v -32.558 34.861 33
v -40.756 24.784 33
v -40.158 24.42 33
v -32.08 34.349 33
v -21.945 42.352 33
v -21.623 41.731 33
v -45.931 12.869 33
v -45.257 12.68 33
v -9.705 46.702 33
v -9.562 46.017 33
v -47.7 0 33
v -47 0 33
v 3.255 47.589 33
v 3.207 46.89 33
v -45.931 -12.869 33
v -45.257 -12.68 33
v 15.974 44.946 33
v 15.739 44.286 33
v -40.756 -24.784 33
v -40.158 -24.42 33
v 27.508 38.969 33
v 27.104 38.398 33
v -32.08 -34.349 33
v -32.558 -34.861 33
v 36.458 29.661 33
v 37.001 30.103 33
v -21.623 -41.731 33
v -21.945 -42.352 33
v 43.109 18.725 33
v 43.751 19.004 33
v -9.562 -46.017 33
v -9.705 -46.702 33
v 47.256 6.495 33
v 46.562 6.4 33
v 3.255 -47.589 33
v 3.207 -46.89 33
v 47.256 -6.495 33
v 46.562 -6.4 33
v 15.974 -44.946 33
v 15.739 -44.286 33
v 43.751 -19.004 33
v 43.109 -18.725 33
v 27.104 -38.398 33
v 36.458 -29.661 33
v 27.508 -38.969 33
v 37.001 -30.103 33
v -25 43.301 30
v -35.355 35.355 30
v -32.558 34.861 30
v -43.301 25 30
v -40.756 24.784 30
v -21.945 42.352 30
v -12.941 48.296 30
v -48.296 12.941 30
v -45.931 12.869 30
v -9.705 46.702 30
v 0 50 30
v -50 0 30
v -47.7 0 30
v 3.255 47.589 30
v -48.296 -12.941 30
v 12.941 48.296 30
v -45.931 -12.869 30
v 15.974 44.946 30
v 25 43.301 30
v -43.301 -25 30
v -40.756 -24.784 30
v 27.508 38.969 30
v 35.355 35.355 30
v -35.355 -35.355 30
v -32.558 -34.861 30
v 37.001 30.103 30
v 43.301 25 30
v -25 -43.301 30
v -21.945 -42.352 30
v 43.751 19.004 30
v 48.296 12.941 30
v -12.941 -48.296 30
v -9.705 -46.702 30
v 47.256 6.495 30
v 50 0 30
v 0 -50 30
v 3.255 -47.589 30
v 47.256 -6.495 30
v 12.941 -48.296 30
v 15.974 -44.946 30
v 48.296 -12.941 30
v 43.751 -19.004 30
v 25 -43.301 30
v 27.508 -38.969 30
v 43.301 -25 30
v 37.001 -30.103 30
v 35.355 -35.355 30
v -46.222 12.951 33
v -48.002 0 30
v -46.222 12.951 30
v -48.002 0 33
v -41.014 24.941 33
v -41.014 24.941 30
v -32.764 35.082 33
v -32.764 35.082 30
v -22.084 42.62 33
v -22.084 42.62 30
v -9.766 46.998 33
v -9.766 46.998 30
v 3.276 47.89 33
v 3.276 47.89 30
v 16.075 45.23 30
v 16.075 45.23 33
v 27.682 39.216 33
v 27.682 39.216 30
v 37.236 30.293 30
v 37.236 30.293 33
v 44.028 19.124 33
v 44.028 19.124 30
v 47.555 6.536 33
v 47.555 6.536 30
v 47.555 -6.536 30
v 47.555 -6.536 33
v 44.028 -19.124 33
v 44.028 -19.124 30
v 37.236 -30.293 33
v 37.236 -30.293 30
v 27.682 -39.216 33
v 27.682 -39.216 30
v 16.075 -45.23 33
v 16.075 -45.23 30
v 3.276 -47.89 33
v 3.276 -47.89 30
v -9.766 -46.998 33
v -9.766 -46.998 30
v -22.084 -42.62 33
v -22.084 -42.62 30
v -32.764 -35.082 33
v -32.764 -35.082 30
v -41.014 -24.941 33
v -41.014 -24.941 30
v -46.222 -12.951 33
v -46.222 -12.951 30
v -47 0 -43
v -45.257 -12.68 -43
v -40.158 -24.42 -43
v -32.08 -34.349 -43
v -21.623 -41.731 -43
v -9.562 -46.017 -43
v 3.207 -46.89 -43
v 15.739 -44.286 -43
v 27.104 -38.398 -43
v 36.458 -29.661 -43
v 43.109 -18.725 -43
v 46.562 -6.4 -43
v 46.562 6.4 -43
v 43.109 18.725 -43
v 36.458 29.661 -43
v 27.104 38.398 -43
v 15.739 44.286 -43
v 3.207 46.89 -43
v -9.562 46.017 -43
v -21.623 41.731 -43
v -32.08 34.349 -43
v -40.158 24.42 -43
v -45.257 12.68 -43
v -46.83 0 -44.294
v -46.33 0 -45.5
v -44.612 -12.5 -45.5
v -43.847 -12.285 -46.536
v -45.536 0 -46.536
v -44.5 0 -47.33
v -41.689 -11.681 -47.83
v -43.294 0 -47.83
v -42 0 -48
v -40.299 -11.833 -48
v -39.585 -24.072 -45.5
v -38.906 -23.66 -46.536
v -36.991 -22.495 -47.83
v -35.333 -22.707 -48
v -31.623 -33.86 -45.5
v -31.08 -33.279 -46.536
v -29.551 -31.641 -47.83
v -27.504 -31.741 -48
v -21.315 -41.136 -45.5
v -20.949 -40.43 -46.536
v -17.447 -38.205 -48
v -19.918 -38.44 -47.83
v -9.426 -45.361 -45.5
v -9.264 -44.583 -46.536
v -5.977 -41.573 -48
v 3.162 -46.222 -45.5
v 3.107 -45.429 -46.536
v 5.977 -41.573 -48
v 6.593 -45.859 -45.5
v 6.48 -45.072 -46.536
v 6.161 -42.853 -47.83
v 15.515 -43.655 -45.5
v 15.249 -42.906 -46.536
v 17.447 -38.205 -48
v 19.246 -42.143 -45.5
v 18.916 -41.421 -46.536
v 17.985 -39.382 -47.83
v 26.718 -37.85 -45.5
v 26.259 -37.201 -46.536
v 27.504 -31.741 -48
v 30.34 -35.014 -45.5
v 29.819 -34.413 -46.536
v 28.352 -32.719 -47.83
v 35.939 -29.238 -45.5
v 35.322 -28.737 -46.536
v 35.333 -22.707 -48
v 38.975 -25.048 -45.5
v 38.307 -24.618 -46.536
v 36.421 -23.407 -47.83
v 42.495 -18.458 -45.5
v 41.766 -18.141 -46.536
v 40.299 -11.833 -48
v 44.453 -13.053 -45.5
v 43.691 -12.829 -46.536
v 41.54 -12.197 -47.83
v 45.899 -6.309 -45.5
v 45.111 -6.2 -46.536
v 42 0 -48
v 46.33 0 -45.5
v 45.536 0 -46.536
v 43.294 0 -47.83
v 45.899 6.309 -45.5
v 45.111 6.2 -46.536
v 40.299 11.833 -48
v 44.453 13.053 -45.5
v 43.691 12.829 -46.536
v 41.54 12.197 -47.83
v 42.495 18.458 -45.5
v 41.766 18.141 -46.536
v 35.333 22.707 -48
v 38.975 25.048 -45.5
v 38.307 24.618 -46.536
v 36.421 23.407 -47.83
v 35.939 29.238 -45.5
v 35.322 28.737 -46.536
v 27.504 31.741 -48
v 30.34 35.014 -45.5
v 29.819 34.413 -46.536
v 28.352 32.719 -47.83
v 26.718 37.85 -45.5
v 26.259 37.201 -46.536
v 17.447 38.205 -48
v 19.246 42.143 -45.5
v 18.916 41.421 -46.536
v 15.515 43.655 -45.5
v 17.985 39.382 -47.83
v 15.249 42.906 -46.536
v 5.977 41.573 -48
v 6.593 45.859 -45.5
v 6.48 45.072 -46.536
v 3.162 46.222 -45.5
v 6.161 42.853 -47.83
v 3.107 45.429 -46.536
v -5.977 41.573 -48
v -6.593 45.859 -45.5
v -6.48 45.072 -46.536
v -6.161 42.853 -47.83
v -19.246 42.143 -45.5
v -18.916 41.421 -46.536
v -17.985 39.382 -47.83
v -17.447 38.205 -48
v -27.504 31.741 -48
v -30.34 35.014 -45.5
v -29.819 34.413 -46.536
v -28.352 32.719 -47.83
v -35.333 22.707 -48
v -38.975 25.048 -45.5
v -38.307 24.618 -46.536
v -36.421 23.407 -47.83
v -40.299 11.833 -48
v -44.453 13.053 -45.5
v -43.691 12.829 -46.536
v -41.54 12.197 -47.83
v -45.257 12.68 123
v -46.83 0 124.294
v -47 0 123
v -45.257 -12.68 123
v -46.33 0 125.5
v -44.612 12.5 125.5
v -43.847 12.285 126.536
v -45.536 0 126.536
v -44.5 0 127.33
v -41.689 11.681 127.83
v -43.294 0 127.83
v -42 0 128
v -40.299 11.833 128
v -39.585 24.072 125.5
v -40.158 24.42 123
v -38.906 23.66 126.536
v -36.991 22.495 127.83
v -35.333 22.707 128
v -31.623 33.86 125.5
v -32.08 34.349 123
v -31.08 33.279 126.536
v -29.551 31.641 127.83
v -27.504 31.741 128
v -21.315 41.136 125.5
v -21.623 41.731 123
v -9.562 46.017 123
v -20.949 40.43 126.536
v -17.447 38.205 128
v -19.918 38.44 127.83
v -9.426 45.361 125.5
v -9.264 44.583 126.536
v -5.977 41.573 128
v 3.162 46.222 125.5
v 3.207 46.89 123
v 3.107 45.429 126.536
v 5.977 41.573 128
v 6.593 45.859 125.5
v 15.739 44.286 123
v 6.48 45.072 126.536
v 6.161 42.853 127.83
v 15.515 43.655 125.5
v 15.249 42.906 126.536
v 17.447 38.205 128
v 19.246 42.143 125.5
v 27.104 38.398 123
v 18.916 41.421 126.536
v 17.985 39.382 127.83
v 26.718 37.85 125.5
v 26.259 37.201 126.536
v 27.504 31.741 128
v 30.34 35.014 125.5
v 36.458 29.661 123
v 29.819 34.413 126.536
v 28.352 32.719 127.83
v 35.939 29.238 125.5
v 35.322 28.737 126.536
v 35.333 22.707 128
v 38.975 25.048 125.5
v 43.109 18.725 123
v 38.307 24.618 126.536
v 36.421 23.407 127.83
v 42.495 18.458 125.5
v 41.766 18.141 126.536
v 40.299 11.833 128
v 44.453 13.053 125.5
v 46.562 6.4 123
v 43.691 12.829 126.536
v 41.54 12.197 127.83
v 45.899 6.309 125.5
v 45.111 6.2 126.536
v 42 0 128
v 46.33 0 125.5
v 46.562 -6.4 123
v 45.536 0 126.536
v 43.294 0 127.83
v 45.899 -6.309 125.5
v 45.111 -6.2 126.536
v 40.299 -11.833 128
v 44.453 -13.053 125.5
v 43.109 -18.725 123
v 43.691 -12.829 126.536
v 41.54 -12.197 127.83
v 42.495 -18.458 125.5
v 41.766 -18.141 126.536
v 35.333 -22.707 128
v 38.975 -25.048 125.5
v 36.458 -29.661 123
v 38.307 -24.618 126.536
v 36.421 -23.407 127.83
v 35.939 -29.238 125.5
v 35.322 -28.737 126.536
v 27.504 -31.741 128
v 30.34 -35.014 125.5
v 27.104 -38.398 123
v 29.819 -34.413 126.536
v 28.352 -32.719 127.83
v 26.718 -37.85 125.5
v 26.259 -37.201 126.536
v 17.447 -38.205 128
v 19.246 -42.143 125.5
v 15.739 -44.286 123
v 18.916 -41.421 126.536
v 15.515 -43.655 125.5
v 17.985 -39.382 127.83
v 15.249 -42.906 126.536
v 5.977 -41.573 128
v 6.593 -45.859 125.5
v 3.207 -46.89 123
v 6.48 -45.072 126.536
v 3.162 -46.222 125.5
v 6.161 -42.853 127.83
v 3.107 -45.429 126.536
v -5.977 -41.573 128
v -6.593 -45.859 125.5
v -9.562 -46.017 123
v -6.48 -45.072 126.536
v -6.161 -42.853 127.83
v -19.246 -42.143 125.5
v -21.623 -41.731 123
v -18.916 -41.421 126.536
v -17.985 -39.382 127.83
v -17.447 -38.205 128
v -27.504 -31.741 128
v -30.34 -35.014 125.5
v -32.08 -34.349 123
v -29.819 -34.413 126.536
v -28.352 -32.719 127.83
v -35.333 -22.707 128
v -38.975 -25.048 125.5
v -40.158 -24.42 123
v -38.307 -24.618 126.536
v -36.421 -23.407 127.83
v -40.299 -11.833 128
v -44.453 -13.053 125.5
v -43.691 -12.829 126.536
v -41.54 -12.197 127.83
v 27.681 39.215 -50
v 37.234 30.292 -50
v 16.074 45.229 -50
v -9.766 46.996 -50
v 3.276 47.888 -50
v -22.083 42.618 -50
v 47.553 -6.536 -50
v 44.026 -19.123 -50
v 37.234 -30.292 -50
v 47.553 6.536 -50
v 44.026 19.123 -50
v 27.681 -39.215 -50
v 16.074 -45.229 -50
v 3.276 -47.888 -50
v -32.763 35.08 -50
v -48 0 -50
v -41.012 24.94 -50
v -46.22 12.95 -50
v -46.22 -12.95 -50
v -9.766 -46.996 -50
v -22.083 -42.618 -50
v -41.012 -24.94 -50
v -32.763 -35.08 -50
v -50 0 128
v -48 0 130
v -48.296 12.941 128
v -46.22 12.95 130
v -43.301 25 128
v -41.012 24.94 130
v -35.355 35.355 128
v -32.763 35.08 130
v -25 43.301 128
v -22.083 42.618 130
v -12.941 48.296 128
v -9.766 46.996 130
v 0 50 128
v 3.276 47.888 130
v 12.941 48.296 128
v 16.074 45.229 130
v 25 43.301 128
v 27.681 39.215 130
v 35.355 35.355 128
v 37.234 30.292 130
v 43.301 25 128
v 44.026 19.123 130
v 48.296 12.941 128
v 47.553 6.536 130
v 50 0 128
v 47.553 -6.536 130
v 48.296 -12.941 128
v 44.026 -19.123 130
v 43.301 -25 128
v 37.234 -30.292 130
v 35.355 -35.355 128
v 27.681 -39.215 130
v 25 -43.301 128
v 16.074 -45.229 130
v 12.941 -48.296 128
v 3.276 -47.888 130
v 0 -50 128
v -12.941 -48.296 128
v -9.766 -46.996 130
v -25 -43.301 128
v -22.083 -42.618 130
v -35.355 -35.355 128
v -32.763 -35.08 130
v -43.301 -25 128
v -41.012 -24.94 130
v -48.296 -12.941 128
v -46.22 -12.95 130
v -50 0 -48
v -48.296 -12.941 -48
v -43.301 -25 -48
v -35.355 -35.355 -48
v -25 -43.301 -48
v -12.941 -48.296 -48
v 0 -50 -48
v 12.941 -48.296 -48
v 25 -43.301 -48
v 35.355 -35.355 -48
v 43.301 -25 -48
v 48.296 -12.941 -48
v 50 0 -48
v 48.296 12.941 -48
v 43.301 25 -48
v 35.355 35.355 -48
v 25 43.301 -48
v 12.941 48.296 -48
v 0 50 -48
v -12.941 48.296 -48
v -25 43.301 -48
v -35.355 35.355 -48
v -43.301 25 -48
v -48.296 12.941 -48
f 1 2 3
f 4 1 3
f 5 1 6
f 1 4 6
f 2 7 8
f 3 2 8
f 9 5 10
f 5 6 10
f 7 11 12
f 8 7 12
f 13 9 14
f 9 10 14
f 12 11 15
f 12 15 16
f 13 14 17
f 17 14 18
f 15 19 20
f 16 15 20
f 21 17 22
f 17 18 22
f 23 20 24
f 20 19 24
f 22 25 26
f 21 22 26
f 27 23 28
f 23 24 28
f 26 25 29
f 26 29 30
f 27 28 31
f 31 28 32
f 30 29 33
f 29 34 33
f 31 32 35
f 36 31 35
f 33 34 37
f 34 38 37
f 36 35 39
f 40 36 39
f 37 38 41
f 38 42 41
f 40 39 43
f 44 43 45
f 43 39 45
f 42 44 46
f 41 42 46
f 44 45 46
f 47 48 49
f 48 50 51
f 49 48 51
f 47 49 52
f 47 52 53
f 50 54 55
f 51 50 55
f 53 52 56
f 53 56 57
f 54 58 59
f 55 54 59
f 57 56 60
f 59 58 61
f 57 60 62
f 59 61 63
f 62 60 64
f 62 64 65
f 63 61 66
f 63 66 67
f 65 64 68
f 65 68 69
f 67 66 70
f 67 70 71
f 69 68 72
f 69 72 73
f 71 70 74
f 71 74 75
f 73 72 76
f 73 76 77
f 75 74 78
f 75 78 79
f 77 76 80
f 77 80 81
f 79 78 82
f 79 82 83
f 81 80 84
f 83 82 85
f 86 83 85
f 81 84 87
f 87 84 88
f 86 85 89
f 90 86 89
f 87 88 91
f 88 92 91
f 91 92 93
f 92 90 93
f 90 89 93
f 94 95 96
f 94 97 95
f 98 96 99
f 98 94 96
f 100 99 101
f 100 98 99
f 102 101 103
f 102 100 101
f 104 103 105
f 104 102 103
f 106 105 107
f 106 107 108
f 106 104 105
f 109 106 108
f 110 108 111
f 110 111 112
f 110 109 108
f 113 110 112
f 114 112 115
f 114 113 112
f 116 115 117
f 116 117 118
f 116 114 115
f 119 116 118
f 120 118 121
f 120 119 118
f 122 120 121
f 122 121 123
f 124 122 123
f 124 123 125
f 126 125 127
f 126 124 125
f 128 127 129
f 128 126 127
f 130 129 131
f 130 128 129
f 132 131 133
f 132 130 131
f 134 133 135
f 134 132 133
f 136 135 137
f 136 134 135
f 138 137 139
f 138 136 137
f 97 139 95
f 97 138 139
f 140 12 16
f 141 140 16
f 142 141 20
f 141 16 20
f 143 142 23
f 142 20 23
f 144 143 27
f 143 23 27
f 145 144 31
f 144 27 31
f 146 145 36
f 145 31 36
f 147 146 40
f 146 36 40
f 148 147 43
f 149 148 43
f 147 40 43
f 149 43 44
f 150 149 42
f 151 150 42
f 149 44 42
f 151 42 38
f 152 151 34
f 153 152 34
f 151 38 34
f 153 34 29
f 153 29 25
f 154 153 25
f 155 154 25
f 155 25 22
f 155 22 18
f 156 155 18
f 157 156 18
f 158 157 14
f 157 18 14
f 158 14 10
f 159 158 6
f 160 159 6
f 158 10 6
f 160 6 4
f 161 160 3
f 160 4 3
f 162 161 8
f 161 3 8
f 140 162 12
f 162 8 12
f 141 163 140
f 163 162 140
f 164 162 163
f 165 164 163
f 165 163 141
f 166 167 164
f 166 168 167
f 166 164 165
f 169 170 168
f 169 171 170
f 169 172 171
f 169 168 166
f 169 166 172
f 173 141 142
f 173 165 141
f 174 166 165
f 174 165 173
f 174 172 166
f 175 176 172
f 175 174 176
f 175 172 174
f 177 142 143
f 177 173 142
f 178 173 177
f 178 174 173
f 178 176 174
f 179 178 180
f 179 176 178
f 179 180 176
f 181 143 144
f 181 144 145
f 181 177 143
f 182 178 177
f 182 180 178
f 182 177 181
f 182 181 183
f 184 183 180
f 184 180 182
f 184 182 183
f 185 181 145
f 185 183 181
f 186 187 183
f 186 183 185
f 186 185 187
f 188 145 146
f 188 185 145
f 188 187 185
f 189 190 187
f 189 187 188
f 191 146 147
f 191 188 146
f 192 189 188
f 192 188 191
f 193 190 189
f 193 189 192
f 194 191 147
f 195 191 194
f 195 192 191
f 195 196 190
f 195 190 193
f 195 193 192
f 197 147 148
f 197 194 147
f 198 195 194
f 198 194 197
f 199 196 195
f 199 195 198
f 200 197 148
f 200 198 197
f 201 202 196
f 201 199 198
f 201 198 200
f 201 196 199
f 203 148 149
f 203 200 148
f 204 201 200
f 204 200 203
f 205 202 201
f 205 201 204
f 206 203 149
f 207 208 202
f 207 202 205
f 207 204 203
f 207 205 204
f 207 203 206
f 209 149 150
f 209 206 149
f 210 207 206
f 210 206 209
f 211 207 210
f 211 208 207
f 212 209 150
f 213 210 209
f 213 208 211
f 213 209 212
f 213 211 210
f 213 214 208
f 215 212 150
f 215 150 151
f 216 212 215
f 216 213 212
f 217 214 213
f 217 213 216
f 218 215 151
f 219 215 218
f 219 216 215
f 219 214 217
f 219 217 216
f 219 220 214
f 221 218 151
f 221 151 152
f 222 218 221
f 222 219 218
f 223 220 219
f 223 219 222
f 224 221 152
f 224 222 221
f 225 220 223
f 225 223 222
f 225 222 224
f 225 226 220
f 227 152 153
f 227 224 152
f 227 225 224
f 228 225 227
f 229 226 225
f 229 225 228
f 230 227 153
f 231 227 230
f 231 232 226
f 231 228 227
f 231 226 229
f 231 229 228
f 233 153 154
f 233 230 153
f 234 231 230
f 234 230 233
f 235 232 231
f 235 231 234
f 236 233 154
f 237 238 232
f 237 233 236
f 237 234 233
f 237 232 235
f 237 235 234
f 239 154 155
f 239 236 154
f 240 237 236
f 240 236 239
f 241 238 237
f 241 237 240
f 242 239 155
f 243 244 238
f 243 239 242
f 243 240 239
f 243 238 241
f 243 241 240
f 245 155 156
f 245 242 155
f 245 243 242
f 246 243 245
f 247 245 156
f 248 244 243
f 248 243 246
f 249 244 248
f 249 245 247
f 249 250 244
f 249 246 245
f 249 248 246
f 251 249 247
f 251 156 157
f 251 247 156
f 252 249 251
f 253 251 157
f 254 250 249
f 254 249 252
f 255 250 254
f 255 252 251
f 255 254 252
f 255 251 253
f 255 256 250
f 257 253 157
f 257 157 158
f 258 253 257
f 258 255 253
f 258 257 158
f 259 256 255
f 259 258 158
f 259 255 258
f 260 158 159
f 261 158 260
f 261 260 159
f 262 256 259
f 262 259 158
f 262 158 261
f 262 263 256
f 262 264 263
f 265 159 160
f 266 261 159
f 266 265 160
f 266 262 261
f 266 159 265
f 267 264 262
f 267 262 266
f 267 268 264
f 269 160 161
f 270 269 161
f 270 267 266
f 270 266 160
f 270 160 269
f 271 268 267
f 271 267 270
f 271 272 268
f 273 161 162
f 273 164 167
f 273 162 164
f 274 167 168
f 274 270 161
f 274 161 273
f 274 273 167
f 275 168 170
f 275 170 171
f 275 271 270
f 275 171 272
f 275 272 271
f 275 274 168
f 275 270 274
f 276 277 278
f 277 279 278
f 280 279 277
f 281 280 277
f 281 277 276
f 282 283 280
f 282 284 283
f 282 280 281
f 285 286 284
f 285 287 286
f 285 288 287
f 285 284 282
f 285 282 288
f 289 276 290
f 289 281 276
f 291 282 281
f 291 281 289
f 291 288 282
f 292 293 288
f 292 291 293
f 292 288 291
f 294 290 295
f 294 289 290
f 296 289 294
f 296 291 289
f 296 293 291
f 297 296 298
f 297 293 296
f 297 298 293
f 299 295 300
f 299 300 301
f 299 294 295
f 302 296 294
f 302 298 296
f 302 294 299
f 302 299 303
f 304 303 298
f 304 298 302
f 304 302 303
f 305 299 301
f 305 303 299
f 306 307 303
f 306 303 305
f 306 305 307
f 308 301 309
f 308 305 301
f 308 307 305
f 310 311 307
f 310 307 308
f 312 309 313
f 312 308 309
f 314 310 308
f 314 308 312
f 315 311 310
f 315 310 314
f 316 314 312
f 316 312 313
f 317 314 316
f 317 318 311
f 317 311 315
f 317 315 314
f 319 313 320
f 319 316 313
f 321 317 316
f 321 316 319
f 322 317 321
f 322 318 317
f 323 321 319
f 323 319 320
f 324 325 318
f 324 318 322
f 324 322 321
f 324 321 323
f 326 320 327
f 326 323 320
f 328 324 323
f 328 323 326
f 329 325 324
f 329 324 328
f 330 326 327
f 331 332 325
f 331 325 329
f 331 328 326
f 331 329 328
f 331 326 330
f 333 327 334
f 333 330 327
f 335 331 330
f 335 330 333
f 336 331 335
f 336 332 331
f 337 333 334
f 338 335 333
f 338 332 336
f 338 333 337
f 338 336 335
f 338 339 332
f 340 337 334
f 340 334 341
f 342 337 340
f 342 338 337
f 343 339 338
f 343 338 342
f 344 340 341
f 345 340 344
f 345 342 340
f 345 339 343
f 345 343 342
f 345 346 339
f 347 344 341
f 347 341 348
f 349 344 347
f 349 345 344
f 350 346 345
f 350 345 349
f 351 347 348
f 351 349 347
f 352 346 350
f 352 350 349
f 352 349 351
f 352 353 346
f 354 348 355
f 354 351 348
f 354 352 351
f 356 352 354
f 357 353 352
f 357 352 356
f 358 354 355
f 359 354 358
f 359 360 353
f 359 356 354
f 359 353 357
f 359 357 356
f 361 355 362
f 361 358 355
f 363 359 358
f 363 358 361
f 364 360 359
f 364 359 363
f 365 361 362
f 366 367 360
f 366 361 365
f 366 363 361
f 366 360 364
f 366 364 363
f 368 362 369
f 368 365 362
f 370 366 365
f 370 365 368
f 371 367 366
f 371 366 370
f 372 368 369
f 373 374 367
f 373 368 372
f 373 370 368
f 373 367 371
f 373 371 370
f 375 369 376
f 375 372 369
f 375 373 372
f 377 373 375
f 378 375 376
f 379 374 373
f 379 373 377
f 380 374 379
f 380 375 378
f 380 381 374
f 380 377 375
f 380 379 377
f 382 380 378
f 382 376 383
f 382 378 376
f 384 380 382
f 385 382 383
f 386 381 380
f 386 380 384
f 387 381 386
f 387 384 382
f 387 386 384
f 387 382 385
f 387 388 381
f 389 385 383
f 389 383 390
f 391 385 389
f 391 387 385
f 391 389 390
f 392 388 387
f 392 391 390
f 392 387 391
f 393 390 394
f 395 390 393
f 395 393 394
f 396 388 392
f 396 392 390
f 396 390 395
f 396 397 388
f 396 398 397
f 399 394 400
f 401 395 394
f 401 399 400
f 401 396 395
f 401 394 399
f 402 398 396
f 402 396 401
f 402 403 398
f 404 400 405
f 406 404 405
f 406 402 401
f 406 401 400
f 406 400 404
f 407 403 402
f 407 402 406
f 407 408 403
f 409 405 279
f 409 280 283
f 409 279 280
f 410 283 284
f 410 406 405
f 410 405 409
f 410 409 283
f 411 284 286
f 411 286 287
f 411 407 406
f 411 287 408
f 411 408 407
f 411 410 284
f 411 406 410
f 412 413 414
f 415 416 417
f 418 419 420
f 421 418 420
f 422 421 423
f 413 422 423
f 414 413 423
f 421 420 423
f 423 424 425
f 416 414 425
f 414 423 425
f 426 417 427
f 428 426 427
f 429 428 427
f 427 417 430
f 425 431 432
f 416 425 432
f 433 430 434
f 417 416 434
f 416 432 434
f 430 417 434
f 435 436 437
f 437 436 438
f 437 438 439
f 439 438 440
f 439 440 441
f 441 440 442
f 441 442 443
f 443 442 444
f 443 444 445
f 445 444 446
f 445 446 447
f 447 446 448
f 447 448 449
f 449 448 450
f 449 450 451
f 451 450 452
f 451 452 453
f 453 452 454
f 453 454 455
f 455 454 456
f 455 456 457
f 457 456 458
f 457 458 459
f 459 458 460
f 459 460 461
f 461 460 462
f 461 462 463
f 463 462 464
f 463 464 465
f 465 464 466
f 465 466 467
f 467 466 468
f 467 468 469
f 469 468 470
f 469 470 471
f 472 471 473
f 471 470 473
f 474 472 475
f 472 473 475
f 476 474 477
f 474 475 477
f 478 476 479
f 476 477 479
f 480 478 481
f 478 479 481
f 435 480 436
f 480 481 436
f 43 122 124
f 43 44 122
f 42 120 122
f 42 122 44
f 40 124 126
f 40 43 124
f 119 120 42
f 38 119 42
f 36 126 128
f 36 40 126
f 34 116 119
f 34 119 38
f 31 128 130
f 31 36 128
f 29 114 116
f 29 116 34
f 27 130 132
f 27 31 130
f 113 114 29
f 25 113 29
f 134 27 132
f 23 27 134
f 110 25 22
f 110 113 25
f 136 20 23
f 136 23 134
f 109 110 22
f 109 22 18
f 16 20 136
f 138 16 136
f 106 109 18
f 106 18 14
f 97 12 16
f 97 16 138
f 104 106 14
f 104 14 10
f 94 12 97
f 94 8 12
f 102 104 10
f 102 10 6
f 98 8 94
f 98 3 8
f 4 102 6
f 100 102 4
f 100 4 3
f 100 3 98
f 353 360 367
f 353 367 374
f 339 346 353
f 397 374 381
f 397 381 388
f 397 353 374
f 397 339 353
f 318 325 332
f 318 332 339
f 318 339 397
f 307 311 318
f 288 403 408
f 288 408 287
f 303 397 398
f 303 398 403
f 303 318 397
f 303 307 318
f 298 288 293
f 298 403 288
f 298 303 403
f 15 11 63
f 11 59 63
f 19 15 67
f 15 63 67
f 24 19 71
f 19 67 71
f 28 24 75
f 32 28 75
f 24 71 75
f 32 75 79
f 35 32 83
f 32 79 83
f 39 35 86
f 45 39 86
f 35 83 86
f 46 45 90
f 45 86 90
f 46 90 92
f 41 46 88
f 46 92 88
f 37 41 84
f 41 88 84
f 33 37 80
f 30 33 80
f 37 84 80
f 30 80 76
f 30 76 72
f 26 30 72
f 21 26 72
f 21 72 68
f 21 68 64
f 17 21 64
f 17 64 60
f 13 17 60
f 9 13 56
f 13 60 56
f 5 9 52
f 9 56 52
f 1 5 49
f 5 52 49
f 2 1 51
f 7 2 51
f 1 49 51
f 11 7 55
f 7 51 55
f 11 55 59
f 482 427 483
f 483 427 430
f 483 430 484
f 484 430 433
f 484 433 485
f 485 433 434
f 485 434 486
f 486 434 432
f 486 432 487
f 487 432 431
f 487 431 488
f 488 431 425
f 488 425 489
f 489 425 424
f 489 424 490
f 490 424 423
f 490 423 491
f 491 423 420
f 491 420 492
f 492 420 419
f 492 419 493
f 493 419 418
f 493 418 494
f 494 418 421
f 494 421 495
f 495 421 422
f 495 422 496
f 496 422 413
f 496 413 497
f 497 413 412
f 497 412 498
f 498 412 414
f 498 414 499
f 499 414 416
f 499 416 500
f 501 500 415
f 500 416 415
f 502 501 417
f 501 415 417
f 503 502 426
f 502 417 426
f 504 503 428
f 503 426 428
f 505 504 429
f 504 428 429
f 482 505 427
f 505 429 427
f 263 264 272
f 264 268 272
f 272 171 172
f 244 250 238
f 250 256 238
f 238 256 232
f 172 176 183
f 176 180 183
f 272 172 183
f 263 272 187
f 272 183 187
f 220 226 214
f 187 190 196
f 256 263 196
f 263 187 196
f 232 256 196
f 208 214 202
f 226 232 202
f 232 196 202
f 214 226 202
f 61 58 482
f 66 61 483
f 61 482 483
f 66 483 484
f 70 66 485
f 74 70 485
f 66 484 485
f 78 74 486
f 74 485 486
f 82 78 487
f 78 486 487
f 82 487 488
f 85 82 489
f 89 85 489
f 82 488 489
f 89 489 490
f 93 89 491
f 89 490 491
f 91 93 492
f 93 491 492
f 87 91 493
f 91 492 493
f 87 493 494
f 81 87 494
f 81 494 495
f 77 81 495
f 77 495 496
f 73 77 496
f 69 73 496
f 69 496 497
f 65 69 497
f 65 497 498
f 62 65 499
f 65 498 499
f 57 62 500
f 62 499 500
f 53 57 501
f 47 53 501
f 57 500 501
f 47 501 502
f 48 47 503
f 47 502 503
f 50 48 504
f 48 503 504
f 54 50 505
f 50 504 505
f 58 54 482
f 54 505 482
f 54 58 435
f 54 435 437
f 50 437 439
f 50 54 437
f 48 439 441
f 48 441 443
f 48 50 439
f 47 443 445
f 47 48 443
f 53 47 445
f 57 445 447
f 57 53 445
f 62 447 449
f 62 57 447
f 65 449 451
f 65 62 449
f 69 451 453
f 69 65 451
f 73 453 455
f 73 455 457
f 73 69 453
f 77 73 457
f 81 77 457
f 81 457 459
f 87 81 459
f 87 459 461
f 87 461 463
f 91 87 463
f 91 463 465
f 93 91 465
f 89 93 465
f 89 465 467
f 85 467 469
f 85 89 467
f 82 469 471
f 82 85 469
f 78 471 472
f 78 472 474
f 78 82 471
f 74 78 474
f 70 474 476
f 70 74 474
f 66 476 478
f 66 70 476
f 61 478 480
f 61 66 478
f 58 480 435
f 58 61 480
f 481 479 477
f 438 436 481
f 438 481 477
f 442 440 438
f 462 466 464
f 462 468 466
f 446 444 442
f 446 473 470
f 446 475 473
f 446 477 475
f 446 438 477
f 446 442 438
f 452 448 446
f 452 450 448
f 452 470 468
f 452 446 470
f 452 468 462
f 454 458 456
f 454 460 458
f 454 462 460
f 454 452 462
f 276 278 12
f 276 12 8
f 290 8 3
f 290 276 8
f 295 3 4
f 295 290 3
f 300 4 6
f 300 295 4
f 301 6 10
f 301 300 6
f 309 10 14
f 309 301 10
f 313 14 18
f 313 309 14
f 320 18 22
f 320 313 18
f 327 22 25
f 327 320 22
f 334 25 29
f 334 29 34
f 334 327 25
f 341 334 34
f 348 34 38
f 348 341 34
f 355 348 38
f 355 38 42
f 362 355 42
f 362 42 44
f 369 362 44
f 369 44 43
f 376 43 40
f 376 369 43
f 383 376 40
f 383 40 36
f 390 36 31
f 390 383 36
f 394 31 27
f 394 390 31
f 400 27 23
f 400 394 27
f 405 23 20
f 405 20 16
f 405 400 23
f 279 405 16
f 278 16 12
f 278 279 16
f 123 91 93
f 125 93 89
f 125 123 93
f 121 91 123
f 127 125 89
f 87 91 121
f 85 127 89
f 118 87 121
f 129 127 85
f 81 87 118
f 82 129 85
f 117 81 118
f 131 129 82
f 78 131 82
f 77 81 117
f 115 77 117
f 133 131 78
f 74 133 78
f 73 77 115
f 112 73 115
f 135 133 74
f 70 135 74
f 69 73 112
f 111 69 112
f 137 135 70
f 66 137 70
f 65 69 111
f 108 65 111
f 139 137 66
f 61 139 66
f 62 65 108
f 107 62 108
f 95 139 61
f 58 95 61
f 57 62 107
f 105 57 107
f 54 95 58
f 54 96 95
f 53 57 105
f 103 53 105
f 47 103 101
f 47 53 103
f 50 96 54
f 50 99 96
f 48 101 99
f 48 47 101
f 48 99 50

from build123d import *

# Parameters (mm, degrees)
F0_W    = 3
F0_H    = 2
F0_W_2  = 47
F4_SIZE = 2
F5_R    = 5
F6_SIZE = 2
F7_R    = 5


with BuildPart() as f1:
    # F0 (on Front) → F1 (revolve)
    with BuildSketch(Plane.XZ):
        with Locations((-48.5, 129)):
            Rectangle(F0_W, F0_H)
        Polygon((-47, 128), (-50, 128), (-50, 30), (-48.001913, 30), (-48.001913, 33), (-47, 33), align=None)
        with Locations((-23.5, 129)):
            Rectangle(F0_W_2, F0_H)
    revolve(axis=Axis((0, 0, 129), (0, 0, -1)))

    # F6
    f6_edges = [f1.edges().sort_by_distance(p)[0] for p in [
        (50, 0, 130),
    ]]
    chamfer(f6_edges, length=F6_SIZE)

    # F7
    f7_edges = [f1.edges().sort_by_distance(p)[0] for p in [
        (47, 0, 128),
    ]]
    fillet(f7_edges, radius=F7_R)


with BuildPart() as f3:
    # F2 (on Front) → F3 (revolve)
    with BuildSketch(Plane.XZ):
        Polygon((-47.7, 33), (-47.7, 30), (-50, 30), (-50, -50), (-47, -50), (0, -50), (0, -48), (-47, -48), (-47, 33), align=None)
    revolve(axis=Axis((0, 0, -49), (0, 0, 1)))

    # F4
    f4_edges = [f3.edges().sort_by_distance(p)[0] for p in [
        (50, 0, -50),
    ]]
    chamfer(f4_edges, length=F4_SIZE)

    # F5
    f5_edges = [f3.edges().sort_by_distance(p)[0] for p in [
        (47, 0, -48),
    ]]
    fillet(f5_edges, radius=F5_R)


solid = Compound([f1.part, f3.part])
